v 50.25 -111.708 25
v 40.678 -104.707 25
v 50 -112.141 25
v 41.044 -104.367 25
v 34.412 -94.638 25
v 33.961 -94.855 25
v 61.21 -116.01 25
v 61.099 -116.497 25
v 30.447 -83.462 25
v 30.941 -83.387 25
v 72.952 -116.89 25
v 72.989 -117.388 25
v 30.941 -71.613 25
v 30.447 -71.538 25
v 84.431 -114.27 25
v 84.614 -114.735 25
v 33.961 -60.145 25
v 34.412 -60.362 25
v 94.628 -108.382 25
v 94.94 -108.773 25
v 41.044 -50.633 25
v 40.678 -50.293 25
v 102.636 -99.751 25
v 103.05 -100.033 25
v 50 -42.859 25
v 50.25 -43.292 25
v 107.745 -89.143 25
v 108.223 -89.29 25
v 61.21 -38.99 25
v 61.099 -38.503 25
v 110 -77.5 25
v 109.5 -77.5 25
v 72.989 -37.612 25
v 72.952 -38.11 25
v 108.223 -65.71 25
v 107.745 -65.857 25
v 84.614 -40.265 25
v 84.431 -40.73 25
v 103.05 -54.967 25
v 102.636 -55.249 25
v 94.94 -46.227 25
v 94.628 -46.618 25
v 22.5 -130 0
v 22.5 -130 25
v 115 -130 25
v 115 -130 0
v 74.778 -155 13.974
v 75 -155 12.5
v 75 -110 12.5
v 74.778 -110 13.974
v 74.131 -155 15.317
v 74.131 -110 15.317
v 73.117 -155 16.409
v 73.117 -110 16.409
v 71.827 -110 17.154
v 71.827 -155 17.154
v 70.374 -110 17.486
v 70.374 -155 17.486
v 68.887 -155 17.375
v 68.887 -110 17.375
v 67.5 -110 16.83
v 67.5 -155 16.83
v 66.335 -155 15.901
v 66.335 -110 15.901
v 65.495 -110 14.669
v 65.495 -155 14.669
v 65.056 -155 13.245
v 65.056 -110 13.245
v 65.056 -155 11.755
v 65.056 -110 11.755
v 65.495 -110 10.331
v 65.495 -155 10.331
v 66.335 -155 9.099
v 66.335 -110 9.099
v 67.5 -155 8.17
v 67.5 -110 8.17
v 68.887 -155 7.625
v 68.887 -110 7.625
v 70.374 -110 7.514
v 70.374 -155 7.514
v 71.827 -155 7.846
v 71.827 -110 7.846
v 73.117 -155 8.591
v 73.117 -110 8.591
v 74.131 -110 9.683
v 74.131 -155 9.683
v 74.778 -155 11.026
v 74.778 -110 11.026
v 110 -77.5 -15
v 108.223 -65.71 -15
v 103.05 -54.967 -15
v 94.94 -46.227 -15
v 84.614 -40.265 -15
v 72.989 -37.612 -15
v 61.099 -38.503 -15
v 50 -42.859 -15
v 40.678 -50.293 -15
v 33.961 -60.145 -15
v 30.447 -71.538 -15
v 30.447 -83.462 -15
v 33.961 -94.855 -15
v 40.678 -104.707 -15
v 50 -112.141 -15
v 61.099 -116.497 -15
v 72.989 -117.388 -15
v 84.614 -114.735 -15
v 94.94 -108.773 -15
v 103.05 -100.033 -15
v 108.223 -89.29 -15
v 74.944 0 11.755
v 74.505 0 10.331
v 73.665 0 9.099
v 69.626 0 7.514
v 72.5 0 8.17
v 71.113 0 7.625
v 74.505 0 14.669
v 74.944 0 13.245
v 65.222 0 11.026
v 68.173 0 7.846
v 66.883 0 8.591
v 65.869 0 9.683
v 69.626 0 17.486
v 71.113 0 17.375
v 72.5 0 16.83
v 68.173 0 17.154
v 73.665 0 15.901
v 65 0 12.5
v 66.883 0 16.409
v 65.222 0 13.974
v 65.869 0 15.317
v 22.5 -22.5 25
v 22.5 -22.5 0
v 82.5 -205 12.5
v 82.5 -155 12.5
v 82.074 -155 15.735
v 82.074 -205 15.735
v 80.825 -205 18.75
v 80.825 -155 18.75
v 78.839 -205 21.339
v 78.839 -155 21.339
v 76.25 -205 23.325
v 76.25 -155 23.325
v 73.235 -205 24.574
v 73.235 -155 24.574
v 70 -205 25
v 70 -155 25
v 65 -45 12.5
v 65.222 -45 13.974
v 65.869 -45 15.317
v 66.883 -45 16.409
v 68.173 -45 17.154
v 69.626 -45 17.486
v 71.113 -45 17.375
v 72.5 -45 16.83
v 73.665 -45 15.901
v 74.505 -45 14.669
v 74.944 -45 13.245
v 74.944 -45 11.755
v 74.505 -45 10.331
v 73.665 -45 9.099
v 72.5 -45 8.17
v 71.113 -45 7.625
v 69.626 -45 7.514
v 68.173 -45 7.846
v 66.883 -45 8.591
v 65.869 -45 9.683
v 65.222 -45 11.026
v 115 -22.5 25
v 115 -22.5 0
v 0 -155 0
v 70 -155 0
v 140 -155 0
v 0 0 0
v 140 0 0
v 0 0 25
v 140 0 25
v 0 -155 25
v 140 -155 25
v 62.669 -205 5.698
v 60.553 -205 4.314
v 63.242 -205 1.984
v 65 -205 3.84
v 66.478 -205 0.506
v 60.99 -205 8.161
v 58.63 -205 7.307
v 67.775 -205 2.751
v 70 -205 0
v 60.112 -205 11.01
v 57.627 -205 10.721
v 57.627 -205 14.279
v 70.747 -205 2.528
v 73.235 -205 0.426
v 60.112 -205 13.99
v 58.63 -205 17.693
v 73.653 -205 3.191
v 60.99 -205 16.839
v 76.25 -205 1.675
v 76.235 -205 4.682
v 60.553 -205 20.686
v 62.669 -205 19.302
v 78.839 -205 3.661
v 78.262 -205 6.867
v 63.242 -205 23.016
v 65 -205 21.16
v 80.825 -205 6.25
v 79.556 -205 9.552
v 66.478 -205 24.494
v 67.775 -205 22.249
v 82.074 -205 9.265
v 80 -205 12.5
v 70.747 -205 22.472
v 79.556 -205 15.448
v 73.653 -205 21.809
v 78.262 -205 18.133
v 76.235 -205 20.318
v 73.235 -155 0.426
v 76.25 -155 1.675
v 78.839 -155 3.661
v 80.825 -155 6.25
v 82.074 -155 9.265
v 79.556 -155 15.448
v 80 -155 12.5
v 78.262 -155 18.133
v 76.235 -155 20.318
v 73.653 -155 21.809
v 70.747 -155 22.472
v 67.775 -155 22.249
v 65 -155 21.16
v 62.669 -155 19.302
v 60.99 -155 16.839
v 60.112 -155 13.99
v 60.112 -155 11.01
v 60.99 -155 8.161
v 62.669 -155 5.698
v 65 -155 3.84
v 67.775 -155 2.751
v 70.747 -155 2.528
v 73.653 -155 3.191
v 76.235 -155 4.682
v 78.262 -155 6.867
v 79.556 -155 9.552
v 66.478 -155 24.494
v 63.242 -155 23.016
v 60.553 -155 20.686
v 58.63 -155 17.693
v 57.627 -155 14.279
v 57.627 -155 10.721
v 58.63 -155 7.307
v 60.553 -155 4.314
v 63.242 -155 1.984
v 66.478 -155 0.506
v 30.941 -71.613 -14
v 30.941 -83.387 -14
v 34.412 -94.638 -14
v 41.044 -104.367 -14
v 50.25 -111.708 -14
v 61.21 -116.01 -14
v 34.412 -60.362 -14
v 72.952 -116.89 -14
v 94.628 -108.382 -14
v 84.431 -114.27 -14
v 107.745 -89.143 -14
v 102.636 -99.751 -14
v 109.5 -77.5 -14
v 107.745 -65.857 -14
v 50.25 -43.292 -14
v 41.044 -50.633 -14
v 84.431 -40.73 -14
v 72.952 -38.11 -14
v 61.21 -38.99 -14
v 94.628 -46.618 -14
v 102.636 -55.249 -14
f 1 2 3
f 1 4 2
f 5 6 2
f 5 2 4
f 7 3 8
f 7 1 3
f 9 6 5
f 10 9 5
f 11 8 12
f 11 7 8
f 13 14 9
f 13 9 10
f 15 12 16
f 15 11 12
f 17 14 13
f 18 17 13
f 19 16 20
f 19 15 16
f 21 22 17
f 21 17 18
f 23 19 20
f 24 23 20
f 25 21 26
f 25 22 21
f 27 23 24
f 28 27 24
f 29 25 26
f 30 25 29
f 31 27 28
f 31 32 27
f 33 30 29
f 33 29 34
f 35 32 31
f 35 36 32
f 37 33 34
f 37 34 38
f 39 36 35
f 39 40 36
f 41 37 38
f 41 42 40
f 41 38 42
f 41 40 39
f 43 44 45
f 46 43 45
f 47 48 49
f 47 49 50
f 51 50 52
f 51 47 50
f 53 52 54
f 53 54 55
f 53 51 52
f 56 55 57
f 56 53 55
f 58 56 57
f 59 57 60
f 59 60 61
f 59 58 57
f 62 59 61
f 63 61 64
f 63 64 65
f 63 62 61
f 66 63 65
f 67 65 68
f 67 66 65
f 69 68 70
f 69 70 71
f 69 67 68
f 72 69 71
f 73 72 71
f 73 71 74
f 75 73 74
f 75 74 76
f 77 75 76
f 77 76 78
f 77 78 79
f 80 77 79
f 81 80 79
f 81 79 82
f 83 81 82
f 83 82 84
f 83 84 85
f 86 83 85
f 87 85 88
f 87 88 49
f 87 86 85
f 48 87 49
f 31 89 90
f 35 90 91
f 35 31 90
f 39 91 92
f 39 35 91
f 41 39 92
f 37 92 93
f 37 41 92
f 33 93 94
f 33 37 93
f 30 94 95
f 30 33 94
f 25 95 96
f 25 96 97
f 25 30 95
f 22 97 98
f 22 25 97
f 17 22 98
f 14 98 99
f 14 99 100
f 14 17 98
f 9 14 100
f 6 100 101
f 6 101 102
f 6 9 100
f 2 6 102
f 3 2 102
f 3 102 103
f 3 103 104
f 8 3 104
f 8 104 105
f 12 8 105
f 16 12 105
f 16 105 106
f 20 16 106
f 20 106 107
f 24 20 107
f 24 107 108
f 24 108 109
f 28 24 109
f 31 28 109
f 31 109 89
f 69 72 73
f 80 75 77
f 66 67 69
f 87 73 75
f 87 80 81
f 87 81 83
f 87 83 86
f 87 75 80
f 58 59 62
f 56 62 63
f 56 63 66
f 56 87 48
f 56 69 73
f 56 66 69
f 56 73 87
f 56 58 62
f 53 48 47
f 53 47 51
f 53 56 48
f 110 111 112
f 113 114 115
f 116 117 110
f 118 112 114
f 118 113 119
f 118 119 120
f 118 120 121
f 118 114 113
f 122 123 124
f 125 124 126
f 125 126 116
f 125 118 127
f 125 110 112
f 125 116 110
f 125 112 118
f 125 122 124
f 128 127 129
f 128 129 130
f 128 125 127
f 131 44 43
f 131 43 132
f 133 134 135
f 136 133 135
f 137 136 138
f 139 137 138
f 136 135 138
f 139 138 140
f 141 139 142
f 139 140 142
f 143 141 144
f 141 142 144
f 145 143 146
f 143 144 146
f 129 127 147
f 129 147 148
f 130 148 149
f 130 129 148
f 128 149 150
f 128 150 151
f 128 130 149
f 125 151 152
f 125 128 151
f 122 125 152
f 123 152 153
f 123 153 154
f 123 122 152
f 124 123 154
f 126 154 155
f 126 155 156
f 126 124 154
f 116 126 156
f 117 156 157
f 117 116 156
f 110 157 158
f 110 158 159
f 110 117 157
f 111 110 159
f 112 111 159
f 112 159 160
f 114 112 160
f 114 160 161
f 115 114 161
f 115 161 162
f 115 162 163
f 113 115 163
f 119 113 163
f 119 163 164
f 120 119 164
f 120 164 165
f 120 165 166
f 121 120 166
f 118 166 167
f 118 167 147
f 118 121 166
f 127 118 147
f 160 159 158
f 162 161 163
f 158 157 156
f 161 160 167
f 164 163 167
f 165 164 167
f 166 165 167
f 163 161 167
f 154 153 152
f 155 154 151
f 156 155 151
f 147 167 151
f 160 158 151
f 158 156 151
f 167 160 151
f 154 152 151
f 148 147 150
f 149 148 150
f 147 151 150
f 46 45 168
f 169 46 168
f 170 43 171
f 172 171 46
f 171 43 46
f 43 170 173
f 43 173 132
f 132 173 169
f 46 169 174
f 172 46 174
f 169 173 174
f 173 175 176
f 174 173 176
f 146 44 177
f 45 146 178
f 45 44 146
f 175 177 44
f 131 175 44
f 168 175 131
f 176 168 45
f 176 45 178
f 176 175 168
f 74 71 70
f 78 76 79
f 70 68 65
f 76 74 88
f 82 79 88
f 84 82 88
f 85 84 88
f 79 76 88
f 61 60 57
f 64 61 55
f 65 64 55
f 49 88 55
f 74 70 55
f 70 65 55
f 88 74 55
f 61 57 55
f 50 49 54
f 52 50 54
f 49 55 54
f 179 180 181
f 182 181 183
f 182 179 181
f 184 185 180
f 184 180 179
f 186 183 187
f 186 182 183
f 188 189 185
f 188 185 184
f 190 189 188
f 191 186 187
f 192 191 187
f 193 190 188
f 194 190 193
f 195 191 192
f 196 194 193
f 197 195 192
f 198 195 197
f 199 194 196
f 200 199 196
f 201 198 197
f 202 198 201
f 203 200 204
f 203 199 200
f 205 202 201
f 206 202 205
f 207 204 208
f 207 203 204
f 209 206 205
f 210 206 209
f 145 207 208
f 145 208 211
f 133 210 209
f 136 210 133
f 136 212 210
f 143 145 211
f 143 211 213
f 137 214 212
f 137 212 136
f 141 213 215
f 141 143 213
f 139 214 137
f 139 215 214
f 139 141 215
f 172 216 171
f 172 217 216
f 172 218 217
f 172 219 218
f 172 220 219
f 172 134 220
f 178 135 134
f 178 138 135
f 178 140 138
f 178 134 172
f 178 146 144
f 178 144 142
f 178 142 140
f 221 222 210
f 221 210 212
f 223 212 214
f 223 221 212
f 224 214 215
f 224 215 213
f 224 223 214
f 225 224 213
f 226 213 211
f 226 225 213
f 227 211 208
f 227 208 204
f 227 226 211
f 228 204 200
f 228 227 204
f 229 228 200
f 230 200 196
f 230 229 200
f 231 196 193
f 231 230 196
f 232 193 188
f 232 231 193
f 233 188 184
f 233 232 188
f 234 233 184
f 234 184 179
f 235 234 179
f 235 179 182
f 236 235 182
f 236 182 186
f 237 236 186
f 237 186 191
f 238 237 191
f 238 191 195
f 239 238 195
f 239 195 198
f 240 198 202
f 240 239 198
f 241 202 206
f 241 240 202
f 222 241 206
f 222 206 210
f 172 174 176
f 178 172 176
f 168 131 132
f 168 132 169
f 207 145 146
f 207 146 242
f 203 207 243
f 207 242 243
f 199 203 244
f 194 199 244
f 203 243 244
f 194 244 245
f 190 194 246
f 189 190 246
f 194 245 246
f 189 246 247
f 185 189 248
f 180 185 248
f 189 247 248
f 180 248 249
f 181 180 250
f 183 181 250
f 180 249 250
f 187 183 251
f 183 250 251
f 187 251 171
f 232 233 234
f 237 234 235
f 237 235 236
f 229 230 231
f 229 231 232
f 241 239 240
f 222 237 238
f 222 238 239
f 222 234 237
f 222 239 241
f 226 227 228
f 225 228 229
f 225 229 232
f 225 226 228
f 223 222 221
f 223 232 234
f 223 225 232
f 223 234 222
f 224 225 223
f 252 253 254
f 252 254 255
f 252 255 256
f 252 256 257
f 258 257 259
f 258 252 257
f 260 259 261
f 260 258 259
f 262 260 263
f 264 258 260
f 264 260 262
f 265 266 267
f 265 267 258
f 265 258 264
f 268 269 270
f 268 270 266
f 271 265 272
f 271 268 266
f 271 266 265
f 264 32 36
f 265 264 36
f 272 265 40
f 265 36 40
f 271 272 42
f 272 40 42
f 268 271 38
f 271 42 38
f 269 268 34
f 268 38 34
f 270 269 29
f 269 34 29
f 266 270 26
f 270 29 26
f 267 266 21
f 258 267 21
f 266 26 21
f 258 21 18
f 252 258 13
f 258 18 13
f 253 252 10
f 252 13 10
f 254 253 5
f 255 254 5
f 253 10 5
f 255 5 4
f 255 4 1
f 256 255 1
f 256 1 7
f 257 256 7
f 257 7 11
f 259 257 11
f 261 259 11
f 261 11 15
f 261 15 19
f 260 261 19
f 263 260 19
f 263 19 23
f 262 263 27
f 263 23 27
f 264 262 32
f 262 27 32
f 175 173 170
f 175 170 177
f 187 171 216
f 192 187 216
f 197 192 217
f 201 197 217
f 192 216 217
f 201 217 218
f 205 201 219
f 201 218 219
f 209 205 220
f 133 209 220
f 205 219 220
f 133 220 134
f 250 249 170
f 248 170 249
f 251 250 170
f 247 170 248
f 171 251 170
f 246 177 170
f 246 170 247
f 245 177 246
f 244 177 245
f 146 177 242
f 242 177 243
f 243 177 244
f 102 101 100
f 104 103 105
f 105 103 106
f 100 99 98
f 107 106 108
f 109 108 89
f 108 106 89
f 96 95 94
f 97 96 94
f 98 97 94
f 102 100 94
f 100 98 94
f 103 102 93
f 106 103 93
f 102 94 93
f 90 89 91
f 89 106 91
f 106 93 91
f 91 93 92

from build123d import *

# Parameters (mm, degrees)
F0_W      = 140
F0_H      = 25
F1_DEPTH  = 155
F2_R      = 40
F2_R_2    = 39.5
F3_DEPTH  = 40
F4_R      = 39.5
F5_DEPTH  = 39
F6_W      = 92.5
F6_H      = 107.5
F6_R      = 40
F7_DEPTH  = 95
F8_R      = 5
F9_DEPTH  = 45
F10_R     = 5
F11_DEPTH = 45
F12_R     = 10
F13_DEPTH = 50


with BuildPart() as f1:
    # F0 (on Front) → F1 (new body)
    with BuildSketch(Plane.XZ):
        with Locations((70, 12.5)):
            Rectangle(F0_W, F0_H)
    extrude(amount=F1_DEPTH)

    # F2 (on face) → F3 (join)
    with BuildSketch(Plane.XY.offset(25)):
        with Locations((70, -77.5)):
            Circle(F2_R)
        with Locations((70, -77.5)):
            Circle(F2_R_2, mode=Mode.SUBTRACT)
        with Locations((70, -77.5)):
            Circle(F2_R_2)
    extrude(amount=-F3_DEPTH)

    # F4 (on face) → F5 (cut)
    with BuildSketch(Plane.XY.offset(25)):
        with Locations((70, -77.5)):
            Circle(F4_R)
    extrude(amount=-F5_DEPTH, mode=Mode.SUBTRACT)

    # F6 (on face) → F7 (cut)
    with BuildSketch(Plane.XY.offset(25)):
        with Locations((68.75, -76.25)):
            Rectangle(F6_W, F6_H)
        with Locations((70, -77.5)):
            Circle(F6_R, mode=Mode.SUBTRACT)
    extrude(amount=-F7_DEPTH, mode=Mode.SUBTRACT)

    # F12 (on face) → F13 (join)
    with BuildSketch(Plane.XZ.offset(155)):
        with BuildLine():
            ThreePointArc((70, 0), (78.8388347648, 3.6611652352), (82.5, 12.5))
            ThreePointArc((82.5, 12.5), (78.8388347648, 21.3388347648), (70, 25))
            ThreePointArc((70, 25), (57.5, 12.5), (70, 0))
        make_face()
        with Locations((70, 12.5)):
            Circle(F12_R, mode=Mode.SUBTRACT)
    extrude(amount=F13_DEPTH)


with BuildPart() as f9:
    # F8 (on face) → F9 (new body)
    with BuildSketch(Plane.XZ.offset(155)):
        with Locations((70, 12.5)):
            Circle(F8_R)
    extrude(amount=-F9_DEPTH)


with BuildPart() as f11:
    # F10 (on face) → F11 (new body)
    with BuildSketch(Plane(origin=(0, 0, 0), x_dir=(-1, 0, 0), z_dir=(0, 1, 0))):
        with Locations((-70, 12.5)):
            Circle(F10_R)
    extrude(amount=-F11_DEPTH)


solid = Compound([f1.part, f9.part, f11.part])
